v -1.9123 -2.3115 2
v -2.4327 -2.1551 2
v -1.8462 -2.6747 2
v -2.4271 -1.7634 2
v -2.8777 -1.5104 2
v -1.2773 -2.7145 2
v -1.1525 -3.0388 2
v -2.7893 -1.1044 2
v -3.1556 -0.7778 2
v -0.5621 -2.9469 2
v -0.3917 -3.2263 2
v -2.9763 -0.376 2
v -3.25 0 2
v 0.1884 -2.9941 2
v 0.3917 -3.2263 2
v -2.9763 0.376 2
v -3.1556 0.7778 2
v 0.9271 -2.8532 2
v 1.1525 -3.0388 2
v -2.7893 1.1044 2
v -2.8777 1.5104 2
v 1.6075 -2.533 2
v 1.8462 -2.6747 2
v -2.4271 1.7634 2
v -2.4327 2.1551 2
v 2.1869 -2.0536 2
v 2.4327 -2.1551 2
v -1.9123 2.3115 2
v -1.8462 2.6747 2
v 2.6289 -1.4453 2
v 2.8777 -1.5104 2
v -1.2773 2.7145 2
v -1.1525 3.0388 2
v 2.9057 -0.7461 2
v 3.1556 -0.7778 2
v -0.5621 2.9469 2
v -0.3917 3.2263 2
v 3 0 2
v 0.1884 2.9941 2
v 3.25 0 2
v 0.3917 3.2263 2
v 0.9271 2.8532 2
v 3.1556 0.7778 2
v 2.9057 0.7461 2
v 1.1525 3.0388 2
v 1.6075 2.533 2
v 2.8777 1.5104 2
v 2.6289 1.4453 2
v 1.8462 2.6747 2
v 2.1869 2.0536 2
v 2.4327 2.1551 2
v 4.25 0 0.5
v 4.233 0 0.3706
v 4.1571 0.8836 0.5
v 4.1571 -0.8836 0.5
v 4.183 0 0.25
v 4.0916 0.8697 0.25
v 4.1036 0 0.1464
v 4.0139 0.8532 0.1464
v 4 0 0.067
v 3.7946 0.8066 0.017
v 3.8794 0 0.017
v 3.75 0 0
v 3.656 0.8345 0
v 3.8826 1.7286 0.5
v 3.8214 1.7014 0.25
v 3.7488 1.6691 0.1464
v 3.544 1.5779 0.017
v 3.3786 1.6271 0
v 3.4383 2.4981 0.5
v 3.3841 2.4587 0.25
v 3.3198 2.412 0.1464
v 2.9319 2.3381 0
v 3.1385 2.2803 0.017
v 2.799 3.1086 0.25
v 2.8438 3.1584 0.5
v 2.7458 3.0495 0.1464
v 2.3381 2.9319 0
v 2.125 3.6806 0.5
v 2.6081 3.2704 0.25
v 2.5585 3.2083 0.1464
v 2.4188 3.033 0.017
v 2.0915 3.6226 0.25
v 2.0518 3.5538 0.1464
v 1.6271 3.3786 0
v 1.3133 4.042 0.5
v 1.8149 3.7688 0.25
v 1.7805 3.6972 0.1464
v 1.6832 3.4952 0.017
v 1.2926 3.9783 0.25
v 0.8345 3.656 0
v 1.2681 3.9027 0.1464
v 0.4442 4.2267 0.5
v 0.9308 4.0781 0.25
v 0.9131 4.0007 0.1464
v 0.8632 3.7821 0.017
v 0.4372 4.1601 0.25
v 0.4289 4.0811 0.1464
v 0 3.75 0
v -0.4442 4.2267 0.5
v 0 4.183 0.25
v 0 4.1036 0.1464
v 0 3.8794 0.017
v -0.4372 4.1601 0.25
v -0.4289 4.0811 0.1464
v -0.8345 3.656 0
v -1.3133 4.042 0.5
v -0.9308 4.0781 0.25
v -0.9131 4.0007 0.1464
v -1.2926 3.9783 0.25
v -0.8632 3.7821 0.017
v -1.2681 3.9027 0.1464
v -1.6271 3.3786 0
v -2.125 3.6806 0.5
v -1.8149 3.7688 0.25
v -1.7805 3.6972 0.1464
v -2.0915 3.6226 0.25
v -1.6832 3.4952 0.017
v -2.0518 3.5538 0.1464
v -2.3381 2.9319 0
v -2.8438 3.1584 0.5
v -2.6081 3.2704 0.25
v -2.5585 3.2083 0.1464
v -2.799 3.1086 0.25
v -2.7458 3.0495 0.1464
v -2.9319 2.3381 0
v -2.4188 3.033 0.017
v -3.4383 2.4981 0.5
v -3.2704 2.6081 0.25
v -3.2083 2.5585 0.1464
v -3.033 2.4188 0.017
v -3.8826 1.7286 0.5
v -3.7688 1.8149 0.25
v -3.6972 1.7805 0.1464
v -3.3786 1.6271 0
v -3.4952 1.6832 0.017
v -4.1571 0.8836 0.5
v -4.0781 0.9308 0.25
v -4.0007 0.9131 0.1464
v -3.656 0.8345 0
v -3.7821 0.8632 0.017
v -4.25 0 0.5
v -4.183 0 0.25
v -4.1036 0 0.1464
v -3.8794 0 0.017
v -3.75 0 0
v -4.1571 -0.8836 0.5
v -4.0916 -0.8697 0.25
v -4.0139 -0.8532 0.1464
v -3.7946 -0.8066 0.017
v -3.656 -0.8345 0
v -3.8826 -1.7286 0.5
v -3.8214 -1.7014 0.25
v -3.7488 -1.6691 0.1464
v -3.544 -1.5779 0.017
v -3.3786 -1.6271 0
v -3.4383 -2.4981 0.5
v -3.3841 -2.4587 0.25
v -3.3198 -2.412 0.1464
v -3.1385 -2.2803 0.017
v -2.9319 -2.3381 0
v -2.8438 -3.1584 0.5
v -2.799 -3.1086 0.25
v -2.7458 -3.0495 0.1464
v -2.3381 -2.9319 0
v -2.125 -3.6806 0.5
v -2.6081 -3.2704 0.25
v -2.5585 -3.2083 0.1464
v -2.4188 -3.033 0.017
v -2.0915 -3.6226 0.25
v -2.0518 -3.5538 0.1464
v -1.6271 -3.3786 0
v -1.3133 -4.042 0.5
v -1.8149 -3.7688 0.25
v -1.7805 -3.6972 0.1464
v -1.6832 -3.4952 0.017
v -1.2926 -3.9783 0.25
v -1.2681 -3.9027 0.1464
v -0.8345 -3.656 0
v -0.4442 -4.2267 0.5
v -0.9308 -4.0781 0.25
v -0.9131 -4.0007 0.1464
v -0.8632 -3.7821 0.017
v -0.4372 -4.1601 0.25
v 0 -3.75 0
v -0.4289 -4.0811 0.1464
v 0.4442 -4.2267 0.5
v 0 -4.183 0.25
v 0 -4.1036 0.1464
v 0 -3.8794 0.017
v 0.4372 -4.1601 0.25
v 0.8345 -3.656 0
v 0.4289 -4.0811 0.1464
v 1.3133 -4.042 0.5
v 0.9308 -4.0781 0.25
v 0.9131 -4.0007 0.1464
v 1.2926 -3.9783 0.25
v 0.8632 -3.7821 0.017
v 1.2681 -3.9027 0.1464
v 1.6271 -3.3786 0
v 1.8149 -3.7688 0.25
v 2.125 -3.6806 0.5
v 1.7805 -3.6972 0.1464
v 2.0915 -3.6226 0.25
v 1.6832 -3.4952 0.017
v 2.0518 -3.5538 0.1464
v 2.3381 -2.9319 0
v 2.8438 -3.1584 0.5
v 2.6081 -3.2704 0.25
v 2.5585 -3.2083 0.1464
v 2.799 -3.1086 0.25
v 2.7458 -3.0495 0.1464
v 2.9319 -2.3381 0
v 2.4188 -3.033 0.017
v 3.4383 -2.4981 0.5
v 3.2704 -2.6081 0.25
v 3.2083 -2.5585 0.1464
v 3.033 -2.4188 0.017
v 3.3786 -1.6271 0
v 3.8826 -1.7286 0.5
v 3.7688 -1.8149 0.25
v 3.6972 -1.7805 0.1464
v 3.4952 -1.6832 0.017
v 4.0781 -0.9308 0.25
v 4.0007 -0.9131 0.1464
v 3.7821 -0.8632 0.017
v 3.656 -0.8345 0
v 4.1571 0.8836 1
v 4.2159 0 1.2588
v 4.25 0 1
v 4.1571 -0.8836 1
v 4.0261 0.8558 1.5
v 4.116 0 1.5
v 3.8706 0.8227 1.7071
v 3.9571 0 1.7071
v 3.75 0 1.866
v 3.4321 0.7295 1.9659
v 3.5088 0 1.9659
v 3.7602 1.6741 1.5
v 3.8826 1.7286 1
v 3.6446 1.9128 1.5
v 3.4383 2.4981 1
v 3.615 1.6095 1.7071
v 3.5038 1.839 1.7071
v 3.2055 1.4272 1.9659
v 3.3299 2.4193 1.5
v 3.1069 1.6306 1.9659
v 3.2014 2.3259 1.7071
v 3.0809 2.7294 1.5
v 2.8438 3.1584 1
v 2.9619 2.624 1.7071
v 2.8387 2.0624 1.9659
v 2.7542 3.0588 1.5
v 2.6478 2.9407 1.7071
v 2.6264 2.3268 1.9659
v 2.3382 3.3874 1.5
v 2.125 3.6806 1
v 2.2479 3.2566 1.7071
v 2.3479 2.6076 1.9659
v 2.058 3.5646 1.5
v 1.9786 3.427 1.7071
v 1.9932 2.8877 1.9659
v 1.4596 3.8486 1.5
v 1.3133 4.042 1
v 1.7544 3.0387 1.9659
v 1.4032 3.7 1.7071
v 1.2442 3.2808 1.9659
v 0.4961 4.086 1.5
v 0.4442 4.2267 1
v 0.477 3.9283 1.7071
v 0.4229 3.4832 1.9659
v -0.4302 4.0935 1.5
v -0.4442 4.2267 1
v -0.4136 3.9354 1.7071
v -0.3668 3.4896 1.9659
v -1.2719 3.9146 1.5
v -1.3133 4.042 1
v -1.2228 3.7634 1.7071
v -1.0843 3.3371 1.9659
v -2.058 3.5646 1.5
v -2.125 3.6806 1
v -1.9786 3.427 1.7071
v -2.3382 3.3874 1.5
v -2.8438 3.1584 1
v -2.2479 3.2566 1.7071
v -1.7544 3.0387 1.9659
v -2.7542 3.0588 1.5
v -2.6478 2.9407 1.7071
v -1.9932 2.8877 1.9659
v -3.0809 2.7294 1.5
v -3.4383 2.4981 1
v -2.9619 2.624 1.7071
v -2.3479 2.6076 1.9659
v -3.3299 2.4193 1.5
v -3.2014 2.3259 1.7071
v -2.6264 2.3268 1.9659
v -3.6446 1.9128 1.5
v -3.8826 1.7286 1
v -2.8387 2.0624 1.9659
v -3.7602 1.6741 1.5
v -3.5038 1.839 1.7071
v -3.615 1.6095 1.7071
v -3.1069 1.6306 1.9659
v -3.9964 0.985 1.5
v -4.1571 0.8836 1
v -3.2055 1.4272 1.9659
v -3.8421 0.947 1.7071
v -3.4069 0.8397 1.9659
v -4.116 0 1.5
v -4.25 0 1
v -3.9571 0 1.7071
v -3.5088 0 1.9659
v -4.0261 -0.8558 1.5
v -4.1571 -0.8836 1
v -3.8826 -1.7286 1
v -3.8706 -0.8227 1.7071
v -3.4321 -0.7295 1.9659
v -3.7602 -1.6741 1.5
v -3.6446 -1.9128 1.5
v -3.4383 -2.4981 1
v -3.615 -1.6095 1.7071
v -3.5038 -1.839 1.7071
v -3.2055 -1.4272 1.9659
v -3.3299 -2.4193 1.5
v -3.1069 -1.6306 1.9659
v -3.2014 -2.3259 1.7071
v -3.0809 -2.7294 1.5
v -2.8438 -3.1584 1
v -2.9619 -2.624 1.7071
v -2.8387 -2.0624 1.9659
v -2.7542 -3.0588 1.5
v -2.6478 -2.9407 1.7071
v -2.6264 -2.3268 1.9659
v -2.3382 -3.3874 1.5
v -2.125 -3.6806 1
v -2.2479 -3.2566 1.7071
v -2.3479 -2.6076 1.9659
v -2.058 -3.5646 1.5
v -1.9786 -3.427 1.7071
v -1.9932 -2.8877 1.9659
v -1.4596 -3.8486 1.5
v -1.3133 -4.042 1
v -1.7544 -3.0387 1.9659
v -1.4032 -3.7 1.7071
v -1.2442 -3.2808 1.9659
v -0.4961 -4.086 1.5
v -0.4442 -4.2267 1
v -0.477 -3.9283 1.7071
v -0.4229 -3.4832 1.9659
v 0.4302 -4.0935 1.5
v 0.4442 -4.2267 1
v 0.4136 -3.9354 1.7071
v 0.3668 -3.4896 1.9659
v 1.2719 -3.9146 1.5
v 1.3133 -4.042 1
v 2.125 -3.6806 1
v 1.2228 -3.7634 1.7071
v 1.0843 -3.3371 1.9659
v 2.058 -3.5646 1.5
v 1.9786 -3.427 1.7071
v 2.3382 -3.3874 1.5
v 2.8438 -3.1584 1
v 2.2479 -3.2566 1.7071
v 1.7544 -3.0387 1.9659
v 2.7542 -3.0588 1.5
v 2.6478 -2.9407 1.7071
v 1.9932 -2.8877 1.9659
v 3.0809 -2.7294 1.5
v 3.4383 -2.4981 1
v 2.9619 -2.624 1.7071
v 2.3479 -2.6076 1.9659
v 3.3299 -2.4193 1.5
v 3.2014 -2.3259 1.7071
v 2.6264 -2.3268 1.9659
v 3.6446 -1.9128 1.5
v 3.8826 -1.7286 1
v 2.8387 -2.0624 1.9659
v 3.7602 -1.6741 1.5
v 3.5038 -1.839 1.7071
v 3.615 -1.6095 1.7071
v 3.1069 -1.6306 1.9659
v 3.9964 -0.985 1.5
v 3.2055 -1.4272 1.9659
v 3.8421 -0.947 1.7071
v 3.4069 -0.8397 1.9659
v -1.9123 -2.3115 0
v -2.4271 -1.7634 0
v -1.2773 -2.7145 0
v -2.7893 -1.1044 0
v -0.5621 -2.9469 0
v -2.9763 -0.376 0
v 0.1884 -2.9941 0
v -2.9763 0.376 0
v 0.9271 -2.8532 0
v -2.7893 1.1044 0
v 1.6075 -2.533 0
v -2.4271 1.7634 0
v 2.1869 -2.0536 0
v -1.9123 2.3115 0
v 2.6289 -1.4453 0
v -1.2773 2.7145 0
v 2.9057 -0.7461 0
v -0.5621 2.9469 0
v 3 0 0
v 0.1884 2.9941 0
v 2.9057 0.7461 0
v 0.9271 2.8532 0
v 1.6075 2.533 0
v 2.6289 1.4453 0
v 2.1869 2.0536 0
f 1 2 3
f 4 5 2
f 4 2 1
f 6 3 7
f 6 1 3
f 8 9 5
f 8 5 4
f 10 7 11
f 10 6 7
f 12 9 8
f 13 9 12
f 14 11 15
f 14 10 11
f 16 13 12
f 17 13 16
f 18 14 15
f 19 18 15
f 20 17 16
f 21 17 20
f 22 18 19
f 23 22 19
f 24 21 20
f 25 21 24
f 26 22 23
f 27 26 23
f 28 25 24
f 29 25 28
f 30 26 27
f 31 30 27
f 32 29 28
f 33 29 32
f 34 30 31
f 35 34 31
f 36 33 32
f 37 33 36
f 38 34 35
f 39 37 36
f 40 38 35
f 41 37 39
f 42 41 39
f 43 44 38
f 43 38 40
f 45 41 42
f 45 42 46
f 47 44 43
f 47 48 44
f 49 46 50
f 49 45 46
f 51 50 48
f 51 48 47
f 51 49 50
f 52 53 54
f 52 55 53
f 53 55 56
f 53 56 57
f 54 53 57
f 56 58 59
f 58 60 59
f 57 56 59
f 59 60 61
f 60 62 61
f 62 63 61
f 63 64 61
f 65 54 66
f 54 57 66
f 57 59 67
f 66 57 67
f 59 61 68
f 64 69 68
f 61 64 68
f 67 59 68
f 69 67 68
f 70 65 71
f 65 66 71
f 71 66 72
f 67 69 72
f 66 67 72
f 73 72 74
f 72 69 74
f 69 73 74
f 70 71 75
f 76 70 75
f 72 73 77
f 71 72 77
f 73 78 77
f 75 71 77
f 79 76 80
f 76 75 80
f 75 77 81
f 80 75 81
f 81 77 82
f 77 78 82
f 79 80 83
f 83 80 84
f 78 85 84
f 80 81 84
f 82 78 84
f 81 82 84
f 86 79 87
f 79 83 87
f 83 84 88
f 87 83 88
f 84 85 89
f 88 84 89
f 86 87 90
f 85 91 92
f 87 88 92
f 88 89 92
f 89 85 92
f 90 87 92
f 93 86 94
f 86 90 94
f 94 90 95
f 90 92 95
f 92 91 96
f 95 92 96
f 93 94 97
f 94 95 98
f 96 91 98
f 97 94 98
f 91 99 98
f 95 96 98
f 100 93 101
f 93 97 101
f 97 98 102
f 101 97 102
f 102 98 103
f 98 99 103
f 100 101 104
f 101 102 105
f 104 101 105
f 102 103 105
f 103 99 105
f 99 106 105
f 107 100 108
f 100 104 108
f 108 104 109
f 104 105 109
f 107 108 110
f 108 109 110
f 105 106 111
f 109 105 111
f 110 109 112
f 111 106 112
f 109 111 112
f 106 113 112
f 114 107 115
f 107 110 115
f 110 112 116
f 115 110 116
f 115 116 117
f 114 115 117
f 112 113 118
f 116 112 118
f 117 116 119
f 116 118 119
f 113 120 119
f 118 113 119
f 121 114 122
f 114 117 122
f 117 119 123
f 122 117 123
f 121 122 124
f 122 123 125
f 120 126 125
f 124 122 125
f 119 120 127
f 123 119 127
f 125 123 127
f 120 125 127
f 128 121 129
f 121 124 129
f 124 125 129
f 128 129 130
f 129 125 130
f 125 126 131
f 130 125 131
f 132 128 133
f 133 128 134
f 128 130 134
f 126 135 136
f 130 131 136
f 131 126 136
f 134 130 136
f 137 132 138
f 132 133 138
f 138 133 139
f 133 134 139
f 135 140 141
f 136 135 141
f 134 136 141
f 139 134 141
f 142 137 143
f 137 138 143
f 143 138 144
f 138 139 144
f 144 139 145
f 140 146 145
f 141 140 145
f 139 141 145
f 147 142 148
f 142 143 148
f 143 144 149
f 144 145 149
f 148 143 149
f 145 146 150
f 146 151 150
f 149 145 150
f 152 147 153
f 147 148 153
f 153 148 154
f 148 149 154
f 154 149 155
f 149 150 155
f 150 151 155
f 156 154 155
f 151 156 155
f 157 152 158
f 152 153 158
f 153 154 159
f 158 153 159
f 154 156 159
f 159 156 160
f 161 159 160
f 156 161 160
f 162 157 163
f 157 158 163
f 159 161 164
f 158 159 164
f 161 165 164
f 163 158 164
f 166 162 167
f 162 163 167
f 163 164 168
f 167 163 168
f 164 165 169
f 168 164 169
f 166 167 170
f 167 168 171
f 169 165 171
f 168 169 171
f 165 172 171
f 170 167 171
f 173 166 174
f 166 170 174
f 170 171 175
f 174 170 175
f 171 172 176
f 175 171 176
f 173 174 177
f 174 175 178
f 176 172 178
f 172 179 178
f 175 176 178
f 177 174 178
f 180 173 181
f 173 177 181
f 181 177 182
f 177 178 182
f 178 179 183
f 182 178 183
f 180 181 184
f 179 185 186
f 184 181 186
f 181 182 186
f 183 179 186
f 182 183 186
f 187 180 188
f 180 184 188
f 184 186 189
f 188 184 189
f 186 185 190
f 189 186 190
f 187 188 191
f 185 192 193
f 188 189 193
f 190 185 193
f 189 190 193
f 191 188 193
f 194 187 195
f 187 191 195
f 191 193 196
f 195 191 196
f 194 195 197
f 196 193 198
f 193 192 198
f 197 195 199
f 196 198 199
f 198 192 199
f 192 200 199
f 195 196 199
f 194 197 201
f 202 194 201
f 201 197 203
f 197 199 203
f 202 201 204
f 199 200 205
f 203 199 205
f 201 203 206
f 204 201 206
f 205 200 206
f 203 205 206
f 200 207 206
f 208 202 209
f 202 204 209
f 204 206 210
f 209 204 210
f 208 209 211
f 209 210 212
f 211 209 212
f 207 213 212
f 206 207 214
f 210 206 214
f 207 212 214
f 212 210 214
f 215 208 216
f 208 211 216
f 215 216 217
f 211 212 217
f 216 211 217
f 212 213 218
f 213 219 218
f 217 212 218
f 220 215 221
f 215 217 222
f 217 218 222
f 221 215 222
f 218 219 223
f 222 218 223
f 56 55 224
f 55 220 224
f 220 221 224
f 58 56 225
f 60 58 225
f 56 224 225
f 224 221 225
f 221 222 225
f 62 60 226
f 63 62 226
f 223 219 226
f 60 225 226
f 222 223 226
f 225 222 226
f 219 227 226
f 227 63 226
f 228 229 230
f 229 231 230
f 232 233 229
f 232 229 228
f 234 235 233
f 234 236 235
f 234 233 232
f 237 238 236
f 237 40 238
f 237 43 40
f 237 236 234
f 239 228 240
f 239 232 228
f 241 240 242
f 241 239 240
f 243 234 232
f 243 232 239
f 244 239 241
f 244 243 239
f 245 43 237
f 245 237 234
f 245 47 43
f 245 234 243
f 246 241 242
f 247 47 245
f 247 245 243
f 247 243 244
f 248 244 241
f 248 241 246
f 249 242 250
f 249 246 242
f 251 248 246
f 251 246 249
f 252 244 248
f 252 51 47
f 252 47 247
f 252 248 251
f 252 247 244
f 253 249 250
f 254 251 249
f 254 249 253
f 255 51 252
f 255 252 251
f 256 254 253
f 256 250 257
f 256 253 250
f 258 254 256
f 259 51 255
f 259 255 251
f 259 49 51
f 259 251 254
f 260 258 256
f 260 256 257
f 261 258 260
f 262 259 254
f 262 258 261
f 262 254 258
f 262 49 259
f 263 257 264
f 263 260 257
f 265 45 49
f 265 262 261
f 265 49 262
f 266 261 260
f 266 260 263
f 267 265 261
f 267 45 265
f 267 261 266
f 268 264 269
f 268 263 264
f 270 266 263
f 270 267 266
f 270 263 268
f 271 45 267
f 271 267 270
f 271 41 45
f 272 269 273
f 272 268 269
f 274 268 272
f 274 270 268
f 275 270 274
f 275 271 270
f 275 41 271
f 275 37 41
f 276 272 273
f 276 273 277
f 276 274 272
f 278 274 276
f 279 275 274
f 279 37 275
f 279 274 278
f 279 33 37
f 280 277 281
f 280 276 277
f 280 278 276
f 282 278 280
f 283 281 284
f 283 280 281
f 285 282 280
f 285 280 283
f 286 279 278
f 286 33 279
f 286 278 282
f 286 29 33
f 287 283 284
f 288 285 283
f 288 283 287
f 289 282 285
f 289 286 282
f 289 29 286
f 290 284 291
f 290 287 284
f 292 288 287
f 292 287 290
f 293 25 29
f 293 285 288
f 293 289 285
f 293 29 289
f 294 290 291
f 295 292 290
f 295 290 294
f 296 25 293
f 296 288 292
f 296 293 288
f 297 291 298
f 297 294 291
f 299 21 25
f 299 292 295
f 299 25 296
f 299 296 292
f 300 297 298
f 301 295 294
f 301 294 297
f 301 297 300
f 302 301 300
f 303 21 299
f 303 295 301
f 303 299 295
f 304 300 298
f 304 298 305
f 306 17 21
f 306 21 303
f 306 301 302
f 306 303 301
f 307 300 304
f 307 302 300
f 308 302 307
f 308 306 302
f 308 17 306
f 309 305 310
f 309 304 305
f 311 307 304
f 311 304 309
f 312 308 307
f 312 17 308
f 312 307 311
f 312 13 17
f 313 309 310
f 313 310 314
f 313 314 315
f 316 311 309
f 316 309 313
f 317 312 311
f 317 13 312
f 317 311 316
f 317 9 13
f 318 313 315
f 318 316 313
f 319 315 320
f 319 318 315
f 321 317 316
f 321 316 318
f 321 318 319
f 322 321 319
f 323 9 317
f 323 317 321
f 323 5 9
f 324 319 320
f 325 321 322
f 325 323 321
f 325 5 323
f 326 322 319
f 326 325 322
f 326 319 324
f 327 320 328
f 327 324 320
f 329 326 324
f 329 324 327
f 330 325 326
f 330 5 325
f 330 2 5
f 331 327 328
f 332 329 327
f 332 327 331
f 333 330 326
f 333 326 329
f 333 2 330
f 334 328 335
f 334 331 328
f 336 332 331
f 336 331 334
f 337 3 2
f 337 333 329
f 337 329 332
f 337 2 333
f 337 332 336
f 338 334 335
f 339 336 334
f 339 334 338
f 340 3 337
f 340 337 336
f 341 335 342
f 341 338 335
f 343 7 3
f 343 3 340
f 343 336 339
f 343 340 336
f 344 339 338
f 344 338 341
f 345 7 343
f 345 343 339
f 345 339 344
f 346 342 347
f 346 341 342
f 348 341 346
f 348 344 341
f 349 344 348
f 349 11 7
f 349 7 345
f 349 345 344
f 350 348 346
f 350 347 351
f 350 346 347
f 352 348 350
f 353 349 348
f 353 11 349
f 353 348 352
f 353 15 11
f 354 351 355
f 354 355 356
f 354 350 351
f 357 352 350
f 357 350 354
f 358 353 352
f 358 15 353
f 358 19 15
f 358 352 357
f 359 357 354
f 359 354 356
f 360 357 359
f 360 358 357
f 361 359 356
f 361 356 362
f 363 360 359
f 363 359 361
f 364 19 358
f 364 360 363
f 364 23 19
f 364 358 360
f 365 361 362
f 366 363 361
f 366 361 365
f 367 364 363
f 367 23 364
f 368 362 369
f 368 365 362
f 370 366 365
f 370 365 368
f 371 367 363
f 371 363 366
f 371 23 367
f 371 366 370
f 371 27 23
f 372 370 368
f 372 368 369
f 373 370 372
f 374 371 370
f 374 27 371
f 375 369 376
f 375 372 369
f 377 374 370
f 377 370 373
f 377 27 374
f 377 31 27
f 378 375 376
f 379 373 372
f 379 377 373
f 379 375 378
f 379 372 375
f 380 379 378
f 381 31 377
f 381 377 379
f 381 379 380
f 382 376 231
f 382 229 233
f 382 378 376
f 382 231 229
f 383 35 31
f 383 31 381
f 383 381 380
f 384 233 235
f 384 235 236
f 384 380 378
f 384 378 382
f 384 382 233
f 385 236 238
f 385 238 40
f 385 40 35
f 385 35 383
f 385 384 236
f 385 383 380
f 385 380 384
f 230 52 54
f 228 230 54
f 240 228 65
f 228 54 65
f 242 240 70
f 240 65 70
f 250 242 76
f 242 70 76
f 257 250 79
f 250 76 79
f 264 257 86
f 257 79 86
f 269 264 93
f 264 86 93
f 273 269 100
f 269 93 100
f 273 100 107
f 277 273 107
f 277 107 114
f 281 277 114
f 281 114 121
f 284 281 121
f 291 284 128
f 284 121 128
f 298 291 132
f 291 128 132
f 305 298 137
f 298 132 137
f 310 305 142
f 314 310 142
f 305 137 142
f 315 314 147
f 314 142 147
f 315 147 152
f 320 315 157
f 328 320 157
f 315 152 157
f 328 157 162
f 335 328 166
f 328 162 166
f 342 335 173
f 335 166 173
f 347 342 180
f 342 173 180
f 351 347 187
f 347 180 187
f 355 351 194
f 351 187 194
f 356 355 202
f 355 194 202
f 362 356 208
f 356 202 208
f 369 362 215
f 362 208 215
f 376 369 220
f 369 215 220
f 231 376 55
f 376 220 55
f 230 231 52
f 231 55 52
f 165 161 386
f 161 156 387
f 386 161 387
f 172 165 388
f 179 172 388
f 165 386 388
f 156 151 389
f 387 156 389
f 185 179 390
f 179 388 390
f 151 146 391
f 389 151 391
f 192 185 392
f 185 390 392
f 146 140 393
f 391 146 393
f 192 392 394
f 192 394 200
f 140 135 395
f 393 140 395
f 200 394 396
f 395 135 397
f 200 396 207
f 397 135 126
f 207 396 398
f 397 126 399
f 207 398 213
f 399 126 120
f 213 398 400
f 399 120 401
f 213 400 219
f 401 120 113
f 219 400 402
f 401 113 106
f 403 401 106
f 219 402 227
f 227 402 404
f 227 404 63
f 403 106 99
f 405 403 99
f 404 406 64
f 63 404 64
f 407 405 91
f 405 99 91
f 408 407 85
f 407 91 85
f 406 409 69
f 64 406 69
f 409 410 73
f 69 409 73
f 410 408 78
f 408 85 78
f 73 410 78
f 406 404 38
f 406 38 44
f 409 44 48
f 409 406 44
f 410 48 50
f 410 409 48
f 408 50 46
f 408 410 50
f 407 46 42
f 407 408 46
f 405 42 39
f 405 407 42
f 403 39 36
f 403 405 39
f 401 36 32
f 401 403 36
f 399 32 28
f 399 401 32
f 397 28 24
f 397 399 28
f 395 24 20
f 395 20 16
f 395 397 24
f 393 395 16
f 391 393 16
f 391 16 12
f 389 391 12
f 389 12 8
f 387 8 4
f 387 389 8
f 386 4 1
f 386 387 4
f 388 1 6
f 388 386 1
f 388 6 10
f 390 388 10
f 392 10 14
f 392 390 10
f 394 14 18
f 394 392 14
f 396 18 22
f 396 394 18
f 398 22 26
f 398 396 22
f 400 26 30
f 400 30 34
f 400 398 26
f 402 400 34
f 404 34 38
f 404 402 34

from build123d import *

# Parameters (mm, degrees)
SKETCH1_R           = 4.25
SKETCH1_R_2         = 3
BOSS_EXTRUDE2_DEPTH = 2
FILLET3_R           = 1
FILLET4_R           = 0.5


with BuildPart() as part:
    # Sketch1 → Boss-Extrude2 (new body)
    with BuildSketch(Plane.XY):
        Circle(SKETCH1_R)
        Circle(SKETCH1_R_2, mode=Mode.SUBTRACT)
    extrude(amount=BOSS_EXTRUDE2_DEPTH)

    # Fillet3
    fillet3_edges = [part.edges().sort_by_distance(p)[0] for p in [
        (-4.25, 0, 2),
    ]]
    fillet(fillet3_edges, radius=FILLET3_R)

    # Fillet4
    fillet4_edges = [part.edges().sort_by_distance(p)[0] for p in [
        (-4.25, 0, 0),
    ]]
    fillet(fillet4_edges, radius=FILLET4_R)


solid = part.part
